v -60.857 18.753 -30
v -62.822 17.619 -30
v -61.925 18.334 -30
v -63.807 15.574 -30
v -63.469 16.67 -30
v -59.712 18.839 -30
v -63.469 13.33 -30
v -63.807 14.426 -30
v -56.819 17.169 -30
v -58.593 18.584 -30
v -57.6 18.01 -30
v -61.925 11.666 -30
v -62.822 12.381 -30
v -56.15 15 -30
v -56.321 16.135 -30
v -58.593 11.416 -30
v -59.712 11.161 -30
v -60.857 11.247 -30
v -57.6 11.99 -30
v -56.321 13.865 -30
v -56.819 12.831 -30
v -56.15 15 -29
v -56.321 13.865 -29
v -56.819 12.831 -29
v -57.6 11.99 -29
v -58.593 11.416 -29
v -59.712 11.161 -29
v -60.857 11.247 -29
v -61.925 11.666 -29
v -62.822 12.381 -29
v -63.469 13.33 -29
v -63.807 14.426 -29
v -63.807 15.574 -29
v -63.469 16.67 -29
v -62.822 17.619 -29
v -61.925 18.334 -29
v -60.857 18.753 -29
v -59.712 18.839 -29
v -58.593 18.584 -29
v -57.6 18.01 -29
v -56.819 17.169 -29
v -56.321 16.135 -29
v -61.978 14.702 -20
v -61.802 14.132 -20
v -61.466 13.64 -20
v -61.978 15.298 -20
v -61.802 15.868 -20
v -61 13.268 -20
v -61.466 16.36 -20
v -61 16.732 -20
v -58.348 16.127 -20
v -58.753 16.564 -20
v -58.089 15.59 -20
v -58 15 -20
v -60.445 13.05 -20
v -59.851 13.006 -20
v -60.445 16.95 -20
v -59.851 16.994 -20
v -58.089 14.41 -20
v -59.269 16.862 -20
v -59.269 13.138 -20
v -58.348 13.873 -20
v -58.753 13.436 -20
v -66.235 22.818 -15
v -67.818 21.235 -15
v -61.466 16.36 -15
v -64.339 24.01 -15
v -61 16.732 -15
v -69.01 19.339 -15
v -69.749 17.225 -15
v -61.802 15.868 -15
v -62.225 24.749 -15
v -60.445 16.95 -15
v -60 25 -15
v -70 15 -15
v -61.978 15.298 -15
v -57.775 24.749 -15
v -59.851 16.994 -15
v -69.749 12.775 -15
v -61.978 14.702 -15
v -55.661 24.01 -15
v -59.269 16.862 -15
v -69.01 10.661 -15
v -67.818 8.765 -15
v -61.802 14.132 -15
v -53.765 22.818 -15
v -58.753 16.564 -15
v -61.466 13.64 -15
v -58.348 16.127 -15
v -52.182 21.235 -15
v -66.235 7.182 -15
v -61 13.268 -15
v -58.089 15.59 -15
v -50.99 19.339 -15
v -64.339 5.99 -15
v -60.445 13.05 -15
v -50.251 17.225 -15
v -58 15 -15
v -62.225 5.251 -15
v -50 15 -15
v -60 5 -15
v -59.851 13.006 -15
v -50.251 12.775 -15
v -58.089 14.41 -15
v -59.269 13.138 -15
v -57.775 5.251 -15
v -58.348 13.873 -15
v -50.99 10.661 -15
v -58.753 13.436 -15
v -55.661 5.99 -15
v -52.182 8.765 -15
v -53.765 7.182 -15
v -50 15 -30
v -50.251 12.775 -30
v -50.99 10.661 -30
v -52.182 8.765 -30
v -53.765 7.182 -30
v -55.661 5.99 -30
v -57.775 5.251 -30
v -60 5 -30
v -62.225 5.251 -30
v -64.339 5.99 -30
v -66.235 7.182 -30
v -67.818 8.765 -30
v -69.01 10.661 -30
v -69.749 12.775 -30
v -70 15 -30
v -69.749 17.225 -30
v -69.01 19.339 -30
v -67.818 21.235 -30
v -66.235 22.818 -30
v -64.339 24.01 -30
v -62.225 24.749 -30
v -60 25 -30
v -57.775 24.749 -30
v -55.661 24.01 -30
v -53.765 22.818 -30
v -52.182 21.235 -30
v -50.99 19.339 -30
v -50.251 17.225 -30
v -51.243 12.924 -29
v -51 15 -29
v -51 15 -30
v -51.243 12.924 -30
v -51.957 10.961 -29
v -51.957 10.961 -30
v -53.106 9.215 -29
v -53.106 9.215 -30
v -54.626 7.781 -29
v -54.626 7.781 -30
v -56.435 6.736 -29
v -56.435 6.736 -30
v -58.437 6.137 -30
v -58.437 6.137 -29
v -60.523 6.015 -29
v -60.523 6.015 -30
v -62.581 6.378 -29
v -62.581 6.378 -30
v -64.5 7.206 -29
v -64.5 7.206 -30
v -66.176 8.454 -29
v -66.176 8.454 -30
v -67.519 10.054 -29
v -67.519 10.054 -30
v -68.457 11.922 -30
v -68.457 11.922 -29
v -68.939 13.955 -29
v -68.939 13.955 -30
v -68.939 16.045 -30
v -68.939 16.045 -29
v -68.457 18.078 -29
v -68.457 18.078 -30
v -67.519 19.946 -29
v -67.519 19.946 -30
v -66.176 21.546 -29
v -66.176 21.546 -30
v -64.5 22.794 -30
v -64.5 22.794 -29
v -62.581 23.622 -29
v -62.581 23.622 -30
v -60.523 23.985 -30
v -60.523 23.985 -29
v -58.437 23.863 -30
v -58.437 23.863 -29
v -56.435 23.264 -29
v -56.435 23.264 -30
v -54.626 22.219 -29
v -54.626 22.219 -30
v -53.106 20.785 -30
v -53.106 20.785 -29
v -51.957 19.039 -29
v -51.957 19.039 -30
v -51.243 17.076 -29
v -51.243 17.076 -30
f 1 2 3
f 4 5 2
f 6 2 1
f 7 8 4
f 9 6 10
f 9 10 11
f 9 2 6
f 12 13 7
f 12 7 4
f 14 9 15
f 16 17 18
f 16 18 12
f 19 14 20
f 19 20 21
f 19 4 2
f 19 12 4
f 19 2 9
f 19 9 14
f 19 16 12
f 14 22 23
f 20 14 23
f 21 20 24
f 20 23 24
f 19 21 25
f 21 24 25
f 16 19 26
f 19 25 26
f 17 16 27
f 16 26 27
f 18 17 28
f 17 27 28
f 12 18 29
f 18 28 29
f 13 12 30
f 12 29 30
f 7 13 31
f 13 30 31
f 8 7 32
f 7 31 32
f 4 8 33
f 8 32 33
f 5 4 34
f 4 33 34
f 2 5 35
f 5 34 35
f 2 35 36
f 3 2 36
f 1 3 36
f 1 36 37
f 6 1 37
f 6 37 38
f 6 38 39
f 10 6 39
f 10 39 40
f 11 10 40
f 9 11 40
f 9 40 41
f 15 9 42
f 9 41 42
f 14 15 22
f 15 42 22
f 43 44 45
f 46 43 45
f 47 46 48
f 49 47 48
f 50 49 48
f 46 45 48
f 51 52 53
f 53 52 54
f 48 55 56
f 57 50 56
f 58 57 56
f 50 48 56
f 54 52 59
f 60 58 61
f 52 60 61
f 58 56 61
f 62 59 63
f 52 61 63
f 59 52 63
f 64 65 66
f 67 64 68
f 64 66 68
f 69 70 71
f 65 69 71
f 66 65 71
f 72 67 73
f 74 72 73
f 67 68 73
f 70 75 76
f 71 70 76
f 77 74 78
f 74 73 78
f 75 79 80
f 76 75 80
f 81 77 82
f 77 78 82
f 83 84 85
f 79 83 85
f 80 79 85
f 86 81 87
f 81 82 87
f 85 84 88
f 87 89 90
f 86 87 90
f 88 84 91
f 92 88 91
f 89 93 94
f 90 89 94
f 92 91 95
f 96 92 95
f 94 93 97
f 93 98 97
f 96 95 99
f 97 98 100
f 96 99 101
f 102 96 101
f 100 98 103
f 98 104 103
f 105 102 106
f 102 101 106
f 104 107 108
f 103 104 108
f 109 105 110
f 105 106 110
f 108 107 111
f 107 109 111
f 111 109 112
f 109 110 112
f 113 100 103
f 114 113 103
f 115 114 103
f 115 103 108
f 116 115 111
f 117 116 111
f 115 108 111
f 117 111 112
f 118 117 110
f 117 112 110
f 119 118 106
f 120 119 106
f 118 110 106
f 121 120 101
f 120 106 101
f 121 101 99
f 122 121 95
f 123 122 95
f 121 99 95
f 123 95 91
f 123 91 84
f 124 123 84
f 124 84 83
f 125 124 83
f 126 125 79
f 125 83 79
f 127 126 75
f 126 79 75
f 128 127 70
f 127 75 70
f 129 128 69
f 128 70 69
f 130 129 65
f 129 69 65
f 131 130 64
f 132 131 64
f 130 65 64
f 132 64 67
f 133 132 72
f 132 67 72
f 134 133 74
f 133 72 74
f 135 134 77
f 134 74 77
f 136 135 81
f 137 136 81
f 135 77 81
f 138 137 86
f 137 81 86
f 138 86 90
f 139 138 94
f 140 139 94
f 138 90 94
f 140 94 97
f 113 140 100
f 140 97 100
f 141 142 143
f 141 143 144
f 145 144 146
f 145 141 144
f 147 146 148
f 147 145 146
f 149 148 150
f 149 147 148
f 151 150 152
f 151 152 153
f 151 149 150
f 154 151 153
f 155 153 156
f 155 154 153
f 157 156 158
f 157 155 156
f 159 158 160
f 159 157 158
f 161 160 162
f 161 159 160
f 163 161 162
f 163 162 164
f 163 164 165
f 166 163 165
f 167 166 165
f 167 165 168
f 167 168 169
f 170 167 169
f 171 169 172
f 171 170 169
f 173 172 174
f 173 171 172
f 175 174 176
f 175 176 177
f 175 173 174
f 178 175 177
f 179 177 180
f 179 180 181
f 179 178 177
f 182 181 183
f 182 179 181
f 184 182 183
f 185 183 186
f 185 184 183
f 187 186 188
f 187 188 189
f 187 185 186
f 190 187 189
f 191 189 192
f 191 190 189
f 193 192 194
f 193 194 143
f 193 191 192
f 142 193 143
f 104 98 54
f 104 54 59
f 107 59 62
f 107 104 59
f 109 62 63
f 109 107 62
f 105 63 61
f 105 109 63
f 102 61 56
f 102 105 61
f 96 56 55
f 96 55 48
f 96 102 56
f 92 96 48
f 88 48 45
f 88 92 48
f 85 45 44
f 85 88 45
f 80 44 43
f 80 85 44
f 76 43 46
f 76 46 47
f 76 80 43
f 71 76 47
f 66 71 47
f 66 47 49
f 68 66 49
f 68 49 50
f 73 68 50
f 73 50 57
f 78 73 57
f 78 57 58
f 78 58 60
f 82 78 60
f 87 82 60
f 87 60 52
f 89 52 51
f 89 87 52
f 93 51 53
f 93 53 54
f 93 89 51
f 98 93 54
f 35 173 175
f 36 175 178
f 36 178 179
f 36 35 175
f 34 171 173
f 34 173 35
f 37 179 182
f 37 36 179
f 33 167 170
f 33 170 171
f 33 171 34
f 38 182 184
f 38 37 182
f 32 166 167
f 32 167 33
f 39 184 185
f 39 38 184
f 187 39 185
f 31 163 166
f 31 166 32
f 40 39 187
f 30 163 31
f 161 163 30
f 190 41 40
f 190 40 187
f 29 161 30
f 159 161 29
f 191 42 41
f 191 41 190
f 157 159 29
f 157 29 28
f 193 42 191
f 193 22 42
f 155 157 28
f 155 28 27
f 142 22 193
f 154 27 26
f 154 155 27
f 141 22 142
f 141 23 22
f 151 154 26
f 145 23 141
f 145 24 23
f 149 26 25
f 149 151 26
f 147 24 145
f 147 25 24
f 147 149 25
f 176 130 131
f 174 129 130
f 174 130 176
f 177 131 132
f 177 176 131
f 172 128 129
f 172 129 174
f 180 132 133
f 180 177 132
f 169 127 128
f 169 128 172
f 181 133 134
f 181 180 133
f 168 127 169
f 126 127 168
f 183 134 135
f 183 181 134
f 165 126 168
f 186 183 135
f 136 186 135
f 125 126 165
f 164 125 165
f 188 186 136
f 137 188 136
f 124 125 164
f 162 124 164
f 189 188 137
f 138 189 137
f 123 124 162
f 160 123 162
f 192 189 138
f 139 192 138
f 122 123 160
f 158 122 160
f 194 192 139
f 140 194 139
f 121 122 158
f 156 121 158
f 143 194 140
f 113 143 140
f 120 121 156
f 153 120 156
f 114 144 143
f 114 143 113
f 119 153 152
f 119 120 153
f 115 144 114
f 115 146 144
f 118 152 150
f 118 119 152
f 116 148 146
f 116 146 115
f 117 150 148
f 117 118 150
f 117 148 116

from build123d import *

# Parameters (mm, degrees)
CYLINDER033_R                = 2
CYLINDER033_DEPTH            = 5
TUBE_R                       = 9
TUBE_R_2                     = 3.85
TUBE_DEPTH                   = 1
CYLINDER032_R                = 10
CYLINDER032_DEPTH            = 15
CUT002002004_PLACEMENT_ANGLE = 180


with BuildPart() as cylinder033:
    # Cylinder033 → Cylinder033 (new body)
    with BuildSketch(Plane.XY):
        Circle(CYLINDER033_R)
    extrude(amount=CYLINDER033_DEPTH)


with BuildPart() as fusion014:
    # Tube → Tube (new body)
    with BuildSketch(Plane.XY.offset(14)):
        Circle(TUBE_R)
        Circle(TUBE_R_2, mode=Mode.SUBTRACT)
    extrude(amount=TUBE_DEPTH)

    # Fusion014: union Cylinder033
    add(cylinder033.part)


with BuildPart() as electromagnet:
    # Cylinder032 → Cylinder032 (new body)
    with BuildSketch(Plane.XY):
        Circle(CYLINDER032_R)
    extrude(amount=CYLINDER032_DEPTH)

    # Cut002002004: cut Fusion014
    add(fusion014.part, mode=Mode.SUBTRACT)


with BuildPart() as electromagnet_1:
    # Cut002002004 placement: moved
    add(electromagnet.part.moved(Location((-60, 15, -15))).rotate(Axis((-60, 15, -15), (1, 0, 0)), CUT002002004_PLACEMENT_ANGLE))


solid = electromagnet_1.part
